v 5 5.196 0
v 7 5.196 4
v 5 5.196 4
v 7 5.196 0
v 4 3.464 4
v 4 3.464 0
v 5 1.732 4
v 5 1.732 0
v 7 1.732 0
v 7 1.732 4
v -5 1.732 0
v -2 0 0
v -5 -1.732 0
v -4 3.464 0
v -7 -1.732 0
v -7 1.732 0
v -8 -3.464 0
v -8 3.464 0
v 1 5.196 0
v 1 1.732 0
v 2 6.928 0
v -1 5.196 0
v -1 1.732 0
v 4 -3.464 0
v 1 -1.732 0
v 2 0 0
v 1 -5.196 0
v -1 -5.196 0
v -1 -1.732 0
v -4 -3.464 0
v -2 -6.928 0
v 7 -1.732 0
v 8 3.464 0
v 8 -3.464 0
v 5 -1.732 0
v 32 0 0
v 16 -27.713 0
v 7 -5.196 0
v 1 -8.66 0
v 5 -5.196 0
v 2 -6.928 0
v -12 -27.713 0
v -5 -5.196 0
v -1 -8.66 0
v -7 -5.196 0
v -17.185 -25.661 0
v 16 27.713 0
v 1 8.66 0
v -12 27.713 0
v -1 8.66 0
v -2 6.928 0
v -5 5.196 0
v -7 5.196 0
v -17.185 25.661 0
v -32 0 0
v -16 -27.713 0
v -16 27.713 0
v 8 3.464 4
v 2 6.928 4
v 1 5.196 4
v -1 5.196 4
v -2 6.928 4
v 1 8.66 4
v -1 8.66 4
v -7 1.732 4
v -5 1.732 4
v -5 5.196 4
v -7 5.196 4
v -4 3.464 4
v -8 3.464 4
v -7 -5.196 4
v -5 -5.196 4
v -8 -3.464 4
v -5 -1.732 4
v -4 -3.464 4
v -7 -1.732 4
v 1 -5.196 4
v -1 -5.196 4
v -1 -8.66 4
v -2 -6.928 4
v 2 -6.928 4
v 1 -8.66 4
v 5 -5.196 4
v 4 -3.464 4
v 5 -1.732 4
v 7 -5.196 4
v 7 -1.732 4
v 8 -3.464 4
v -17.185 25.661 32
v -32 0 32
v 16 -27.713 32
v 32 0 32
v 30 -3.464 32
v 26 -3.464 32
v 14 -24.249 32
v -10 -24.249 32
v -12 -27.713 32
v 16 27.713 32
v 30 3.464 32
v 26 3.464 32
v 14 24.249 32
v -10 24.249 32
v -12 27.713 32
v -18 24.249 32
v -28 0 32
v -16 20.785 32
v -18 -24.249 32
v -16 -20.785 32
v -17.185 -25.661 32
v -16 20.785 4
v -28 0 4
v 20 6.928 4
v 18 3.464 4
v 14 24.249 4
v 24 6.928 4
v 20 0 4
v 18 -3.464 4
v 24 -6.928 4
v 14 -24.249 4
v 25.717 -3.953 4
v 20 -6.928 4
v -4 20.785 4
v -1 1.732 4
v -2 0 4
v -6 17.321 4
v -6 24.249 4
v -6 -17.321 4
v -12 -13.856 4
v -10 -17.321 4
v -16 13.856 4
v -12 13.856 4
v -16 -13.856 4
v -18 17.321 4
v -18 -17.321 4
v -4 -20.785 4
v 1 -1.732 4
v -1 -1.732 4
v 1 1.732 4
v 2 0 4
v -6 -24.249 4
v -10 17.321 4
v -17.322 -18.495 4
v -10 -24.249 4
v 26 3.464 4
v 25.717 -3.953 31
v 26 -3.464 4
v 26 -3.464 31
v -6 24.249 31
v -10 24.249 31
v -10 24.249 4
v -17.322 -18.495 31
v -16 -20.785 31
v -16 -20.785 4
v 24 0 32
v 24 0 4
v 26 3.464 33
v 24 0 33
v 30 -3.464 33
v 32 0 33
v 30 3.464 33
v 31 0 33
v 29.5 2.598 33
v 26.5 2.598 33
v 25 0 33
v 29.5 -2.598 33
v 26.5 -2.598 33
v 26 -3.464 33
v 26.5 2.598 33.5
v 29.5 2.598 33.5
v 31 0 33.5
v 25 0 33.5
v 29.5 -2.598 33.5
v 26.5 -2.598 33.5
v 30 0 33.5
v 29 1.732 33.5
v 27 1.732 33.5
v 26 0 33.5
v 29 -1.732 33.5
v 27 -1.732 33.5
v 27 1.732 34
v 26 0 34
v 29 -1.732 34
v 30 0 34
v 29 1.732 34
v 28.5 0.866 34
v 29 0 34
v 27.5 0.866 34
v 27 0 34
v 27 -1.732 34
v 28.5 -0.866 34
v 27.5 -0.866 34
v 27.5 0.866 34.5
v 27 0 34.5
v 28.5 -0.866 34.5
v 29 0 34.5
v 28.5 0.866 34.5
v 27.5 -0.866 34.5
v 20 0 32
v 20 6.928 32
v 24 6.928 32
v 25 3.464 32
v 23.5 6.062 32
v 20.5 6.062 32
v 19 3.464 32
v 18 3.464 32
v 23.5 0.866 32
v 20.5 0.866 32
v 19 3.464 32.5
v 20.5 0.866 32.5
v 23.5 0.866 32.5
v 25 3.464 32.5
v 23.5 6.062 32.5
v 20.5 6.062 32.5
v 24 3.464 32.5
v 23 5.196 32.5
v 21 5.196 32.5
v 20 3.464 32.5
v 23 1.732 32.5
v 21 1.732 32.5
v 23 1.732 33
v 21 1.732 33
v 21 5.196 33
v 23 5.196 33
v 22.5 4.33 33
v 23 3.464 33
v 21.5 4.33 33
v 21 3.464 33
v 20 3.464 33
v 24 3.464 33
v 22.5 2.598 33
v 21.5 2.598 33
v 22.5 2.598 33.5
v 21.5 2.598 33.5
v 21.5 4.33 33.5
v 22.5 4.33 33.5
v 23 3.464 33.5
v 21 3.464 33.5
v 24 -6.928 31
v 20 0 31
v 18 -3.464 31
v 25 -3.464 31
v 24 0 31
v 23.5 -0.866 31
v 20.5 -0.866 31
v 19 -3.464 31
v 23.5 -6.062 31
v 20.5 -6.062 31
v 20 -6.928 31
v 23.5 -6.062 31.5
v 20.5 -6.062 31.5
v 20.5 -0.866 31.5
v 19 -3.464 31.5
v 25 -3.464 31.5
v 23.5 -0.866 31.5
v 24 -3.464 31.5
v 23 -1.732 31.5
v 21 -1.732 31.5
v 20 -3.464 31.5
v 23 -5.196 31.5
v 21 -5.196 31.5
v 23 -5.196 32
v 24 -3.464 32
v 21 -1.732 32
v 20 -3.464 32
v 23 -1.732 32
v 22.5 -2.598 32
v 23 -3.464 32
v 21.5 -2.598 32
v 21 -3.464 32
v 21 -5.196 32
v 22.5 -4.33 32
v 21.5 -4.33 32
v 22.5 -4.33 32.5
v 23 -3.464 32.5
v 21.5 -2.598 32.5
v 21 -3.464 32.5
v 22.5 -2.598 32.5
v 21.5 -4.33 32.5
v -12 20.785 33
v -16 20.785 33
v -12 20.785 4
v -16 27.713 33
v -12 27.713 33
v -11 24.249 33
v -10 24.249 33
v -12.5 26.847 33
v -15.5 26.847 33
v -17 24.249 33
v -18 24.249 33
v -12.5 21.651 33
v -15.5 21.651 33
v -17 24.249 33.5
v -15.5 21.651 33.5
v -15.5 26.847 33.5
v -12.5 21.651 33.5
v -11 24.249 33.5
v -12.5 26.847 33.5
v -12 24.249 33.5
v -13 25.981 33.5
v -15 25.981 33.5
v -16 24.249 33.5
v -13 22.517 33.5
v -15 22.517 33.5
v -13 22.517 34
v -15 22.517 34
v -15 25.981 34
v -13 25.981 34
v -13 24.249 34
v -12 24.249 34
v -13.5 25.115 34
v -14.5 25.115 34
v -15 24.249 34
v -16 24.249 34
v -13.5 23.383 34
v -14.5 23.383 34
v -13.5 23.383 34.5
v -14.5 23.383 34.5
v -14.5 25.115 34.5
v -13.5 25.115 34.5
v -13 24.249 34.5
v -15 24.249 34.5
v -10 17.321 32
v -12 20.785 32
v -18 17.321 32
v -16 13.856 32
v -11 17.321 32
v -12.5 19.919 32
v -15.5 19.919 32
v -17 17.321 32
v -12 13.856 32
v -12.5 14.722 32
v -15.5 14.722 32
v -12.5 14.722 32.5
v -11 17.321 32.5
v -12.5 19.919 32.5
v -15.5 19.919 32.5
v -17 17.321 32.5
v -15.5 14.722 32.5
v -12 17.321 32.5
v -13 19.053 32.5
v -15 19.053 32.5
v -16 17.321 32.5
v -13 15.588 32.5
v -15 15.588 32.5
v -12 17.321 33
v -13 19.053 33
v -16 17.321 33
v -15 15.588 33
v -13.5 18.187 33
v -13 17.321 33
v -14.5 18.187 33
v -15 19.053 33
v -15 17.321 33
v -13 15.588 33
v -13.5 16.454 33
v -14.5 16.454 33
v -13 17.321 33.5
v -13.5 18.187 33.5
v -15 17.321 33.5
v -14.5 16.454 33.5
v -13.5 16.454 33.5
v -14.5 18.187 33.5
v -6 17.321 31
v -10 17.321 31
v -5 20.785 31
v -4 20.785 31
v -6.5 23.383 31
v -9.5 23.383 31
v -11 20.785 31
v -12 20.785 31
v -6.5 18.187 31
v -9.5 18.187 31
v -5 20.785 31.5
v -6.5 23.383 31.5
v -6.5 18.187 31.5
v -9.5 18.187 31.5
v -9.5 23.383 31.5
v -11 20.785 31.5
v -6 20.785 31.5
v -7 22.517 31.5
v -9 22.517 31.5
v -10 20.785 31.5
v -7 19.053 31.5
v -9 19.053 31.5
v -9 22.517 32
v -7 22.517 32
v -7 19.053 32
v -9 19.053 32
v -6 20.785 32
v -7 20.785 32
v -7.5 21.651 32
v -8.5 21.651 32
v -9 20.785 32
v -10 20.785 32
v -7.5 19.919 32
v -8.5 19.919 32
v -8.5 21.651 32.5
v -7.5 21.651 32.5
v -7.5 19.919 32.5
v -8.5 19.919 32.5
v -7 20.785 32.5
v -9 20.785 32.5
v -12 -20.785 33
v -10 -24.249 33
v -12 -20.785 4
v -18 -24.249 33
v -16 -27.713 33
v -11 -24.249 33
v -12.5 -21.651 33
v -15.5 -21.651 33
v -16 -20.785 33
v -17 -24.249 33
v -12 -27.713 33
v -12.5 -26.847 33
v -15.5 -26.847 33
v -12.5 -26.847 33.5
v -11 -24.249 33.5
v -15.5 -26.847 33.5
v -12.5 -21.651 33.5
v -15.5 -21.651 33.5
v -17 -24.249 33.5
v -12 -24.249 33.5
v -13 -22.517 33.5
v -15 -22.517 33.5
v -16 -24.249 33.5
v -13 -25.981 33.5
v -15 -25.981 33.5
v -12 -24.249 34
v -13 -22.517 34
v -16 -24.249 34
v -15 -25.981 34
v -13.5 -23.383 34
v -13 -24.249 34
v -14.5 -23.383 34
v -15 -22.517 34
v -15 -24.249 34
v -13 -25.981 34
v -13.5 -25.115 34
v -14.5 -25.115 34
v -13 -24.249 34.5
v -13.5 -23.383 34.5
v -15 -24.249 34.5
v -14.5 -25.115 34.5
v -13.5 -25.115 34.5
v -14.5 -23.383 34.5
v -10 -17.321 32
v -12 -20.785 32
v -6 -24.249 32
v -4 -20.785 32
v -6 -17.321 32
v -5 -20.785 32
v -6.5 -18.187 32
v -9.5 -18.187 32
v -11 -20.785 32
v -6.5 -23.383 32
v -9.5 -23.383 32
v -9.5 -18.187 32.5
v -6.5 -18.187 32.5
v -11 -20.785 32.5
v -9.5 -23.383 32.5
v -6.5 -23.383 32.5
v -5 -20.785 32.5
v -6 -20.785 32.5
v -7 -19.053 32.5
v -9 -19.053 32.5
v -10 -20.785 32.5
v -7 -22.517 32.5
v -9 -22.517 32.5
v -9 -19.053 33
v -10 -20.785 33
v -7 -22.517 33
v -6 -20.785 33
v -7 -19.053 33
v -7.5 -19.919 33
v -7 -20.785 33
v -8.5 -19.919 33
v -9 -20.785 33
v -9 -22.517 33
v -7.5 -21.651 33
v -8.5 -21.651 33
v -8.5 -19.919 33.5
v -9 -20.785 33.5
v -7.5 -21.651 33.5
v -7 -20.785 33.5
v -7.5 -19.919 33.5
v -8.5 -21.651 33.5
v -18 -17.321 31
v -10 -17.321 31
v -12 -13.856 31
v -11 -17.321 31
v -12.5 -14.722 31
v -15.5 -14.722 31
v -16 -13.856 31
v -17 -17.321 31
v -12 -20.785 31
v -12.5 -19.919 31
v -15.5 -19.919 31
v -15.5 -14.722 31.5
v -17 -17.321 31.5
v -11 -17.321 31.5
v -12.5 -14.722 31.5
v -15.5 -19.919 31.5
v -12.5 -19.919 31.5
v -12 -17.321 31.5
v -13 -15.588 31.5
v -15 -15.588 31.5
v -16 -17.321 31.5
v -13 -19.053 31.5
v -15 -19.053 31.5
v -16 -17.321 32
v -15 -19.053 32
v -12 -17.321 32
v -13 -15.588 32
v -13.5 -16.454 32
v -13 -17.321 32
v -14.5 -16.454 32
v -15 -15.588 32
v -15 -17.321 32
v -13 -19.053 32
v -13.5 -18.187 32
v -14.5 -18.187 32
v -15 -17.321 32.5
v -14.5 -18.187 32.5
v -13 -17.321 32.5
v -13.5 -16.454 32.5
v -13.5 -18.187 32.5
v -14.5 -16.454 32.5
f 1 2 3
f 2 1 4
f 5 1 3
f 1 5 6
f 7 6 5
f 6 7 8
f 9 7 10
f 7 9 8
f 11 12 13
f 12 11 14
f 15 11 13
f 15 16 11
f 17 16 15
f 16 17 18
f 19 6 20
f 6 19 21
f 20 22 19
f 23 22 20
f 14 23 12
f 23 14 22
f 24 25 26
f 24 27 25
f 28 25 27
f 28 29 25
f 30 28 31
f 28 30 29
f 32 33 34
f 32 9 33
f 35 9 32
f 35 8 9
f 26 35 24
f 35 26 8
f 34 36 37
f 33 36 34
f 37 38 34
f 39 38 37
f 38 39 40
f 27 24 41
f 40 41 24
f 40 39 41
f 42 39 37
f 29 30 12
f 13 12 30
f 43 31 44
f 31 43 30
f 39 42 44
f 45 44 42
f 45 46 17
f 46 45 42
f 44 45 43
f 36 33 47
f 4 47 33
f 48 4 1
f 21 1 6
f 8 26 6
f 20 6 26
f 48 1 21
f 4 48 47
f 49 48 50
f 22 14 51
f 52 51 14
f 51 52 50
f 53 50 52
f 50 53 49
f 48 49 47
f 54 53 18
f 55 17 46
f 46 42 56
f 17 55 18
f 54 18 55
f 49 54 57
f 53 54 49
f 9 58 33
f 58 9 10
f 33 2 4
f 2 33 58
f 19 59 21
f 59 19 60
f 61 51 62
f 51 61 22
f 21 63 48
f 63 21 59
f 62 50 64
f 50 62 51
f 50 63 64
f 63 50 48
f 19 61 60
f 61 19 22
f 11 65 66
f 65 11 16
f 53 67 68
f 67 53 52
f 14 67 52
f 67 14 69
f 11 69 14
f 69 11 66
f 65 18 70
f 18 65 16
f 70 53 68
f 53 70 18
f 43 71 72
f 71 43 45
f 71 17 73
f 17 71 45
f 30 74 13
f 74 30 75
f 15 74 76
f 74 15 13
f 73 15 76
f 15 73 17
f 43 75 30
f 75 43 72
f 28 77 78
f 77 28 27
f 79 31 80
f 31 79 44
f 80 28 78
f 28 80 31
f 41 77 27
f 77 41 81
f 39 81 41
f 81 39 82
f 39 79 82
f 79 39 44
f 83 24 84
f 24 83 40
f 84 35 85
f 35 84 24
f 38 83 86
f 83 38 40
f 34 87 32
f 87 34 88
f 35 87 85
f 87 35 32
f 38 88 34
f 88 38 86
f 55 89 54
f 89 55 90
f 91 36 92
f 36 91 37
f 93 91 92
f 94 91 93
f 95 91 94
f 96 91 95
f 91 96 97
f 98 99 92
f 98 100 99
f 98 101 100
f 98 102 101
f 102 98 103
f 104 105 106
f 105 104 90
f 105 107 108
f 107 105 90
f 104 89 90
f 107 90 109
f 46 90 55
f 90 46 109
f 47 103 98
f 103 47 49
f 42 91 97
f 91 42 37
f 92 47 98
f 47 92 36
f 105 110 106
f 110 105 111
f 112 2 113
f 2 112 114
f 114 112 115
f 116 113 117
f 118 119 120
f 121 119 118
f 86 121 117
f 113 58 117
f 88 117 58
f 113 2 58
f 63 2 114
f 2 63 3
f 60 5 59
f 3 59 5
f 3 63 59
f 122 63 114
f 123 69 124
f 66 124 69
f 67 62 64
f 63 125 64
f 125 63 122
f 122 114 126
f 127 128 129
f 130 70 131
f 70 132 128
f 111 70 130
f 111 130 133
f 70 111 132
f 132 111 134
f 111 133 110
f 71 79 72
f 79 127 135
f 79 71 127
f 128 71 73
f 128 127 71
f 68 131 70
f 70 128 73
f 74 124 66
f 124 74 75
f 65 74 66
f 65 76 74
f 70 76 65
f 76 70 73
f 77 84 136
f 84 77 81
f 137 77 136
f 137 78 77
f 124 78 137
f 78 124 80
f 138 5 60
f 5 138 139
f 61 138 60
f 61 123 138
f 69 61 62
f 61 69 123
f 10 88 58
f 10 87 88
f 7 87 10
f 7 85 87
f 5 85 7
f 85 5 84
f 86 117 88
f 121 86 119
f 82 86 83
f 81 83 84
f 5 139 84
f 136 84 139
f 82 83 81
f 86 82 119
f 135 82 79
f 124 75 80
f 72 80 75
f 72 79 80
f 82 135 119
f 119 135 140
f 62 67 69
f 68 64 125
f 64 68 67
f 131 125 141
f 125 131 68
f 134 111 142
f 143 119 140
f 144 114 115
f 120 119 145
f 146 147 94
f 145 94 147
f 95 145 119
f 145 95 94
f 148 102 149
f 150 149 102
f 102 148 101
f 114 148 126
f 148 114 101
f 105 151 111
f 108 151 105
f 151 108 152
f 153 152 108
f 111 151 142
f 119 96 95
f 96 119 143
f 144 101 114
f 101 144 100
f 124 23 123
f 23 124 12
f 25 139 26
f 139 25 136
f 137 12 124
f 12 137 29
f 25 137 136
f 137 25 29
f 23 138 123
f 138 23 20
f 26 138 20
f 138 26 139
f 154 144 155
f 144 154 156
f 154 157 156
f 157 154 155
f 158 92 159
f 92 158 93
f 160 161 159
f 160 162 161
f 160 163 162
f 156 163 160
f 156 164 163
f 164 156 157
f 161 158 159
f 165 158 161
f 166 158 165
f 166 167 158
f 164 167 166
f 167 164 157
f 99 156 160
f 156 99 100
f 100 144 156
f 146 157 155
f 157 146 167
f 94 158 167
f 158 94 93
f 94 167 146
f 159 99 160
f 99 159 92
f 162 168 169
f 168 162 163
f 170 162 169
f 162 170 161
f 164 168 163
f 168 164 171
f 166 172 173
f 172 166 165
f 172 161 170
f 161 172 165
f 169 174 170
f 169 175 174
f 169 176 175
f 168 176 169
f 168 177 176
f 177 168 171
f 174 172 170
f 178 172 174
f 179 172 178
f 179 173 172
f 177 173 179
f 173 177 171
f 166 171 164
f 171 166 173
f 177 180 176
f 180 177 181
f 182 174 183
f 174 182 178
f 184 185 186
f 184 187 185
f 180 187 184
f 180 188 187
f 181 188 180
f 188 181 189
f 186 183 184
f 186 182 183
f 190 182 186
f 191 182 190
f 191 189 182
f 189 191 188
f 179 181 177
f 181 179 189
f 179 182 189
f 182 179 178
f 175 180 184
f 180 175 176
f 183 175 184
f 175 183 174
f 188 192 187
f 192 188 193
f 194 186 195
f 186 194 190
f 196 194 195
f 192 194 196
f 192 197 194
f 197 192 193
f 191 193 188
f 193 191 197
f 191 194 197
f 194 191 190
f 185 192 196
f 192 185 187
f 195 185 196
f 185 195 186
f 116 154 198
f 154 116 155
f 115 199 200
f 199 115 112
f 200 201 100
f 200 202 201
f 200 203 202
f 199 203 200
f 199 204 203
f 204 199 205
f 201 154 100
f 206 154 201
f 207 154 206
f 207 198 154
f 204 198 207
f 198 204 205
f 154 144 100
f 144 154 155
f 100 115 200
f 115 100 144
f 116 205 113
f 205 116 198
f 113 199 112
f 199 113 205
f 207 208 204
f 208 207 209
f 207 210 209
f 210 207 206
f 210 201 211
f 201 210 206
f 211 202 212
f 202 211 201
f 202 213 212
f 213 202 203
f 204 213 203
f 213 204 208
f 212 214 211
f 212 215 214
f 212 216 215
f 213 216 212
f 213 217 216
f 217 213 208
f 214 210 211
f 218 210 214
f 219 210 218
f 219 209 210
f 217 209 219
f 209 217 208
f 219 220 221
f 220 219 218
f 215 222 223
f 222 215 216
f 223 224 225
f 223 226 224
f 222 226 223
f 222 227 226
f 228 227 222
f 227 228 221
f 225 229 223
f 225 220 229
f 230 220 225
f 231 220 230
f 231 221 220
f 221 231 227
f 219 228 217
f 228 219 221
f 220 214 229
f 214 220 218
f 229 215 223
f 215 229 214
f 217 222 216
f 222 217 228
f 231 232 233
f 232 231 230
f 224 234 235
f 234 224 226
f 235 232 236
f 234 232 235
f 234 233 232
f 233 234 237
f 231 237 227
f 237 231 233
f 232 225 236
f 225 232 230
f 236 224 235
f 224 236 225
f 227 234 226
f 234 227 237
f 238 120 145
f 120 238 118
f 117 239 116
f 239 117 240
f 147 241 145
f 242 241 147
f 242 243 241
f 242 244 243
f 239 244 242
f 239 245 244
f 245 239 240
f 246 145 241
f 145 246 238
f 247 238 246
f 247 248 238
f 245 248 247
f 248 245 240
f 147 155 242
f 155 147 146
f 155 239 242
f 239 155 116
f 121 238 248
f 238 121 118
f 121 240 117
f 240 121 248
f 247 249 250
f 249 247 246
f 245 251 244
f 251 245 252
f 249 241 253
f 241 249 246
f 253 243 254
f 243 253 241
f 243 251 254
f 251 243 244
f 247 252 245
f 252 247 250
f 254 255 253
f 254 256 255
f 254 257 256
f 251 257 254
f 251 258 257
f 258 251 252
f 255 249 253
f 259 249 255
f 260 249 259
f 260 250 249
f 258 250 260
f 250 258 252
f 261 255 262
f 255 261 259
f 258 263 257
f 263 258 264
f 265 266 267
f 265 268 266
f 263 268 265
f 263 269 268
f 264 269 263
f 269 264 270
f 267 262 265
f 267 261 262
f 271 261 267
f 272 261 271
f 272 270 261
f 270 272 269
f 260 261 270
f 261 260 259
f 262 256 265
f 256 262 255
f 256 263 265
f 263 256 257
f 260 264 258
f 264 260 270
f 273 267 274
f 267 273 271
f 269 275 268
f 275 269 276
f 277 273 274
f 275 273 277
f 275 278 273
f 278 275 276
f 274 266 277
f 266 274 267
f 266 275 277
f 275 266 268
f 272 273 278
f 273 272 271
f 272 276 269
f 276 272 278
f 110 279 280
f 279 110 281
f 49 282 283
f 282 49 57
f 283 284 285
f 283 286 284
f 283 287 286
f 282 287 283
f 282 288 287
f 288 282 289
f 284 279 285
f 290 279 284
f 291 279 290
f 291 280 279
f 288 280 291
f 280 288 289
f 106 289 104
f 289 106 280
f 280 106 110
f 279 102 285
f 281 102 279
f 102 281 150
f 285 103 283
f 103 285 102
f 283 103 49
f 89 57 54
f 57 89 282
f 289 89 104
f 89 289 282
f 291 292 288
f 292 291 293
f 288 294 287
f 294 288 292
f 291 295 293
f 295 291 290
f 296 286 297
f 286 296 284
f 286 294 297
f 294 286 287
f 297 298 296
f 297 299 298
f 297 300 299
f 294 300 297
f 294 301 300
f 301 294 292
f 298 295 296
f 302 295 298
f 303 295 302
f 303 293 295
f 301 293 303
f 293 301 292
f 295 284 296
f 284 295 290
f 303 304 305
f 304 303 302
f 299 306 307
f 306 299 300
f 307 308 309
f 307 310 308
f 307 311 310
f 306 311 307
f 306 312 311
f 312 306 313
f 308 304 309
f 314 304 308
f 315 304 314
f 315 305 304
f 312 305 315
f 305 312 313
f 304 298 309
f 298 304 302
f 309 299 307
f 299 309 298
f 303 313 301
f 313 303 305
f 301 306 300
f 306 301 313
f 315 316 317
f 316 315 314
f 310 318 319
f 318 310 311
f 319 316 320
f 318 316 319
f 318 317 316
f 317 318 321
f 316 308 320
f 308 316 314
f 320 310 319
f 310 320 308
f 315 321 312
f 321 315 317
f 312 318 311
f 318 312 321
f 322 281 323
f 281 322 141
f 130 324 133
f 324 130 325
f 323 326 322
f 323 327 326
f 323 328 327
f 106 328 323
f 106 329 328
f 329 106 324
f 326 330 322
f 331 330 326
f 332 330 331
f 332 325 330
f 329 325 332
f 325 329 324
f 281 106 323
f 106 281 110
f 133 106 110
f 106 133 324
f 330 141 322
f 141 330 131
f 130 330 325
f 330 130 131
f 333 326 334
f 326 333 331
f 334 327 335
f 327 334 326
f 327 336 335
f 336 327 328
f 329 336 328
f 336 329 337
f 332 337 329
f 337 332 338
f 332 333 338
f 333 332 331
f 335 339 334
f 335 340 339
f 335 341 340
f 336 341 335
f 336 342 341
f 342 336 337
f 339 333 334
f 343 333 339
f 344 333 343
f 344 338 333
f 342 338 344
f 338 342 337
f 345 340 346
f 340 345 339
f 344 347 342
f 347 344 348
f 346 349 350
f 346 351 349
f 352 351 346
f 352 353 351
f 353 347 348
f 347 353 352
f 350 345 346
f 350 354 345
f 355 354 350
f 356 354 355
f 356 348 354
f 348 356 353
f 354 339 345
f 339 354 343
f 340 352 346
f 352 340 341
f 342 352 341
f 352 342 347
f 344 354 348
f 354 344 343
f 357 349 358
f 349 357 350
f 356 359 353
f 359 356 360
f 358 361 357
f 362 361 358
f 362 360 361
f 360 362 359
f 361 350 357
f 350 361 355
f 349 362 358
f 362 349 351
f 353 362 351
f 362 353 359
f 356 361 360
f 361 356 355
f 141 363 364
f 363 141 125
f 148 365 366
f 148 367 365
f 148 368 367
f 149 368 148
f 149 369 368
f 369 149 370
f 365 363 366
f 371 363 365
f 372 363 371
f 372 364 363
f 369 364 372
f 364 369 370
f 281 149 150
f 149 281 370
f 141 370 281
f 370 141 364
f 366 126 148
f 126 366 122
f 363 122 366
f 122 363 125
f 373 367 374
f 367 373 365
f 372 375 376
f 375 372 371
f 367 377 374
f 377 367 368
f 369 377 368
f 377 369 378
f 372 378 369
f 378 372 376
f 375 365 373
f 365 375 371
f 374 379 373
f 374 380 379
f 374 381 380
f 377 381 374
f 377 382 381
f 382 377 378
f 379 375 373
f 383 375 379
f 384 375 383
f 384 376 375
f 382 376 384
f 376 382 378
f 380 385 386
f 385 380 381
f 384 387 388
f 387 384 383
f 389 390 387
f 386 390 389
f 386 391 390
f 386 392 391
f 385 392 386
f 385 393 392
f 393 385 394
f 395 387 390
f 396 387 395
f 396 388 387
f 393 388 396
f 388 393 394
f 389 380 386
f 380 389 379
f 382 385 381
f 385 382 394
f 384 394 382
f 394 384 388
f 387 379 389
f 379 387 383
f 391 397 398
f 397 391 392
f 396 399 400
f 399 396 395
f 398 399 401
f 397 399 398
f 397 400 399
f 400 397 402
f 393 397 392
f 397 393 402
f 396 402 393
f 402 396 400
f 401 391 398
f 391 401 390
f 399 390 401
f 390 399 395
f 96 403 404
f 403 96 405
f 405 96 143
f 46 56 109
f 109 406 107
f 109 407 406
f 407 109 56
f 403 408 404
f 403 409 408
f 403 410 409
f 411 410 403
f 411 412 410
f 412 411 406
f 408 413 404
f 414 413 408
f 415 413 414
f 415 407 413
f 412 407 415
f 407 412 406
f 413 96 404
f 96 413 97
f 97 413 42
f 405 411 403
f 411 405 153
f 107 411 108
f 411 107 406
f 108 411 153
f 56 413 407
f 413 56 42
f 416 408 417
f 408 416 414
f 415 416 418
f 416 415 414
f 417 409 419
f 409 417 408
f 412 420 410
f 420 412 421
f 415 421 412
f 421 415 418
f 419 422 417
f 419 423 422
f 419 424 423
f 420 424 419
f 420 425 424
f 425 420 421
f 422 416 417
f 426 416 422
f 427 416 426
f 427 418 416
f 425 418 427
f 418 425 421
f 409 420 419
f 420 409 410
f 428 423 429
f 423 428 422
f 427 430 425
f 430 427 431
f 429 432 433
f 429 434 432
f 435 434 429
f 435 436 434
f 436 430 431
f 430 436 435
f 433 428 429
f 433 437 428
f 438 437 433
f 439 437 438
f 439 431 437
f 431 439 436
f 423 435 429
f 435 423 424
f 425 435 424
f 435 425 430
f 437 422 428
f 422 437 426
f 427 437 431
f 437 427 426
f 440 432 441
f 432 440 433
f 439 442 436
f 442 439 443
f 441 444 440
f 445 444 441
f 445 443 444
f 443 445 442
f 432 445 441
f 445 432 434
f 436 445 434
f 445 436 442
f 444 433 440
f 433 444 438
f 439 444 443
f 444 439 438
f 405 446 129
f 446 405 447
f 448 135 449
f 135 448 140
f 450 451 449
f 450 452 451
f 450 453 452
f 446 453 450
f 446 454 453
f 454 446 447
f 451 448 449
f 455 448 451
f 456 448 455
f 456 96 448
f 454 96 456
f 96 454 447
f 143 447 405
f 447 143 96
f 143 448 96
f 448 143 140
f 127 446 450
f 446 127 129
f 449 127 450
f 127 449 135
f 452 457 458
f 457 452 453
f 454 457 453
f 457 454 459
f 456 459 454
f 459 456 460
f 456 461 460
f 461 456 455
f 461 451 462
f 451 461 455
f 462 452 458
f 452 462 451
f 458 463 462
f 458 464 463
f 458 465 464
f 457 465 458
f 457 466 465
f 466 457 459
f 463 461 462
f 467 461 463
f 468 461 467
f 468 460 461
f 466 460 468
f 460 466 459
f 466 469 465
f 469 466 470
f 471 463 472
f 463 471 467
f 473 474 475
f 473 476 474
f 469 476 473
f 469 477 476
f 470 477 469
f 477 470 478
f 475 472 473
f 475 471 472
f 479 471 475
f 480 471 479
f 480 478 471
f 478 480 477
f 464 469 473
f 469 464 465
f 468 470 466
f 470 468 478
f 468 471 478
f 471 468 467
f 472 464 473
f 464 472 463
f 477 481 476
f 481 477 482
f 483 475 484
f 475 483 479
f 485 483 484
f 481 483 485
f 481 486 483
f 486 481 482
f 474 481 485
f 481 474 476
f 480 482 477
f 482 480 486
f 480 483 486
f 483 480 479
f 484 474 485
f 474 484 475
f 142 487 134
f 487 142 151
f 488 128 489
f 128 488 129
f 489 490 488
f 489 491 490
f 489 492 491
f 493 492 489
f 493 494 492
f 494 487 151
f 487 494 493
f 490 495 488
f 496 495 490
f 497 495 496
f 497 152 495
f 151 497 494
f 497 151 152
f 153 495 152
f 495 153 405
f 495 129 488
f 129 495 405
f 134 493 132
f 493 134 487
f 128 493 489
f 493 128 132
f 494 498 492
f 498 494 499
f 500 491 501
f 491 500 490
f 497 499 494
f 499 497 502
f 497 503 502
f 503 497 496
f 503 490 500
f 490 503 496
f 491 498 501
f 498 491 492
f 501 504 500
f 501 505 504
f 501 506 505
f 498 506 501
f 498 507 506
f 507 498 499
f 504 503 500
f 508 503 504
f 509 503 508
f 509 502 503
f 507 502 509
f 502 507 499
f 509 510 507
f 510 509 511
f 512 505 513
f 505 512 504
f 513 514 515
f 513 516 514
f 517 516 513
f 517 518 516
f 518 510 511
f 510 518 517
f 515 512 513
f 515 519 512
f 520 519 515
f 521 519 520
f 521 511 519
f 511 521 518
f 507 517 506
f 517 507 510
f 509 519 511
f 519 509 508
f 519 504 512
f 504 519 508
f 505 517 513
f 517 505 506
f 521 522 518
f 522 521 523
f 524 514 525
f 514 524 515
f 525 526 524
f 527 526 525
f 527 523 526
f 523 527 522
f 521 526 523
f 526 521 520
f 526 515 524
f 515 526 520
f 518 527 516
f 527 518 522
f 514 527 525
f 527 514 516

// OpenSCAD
// file: planter_base.scad
module planter_base() {
    difference() {
        linear_extrude(32) circle(32, $fn=6);
        translate([0, 0, 4]) linear_extrude(32) circle(28, $fn = 6);
        linear_extrude(8) circle(2, $fn = 6);
        for (i = [0:60:300]) {
            linear_extrude(8) rotate(i) translate([6, cos(30)*4]) circle(2, $fn = 6);
        }
    }
}
// main file
include <planter_base.scad>;

module planter_00() {
    module pillar(height) {
        linear_extrude(height) circle(4, $fn = 6);
        linear_extrude(height + 0.5) circle(3, $fn = 6);
        linear_extrude(height + 1) circle(2, $fn = 6);
        linear_extrude(height + 1.5) circle(1, $fn = 6);
    }
    union() {
        planter_base();
        for (i = [0:120:240]) {
            rotate(i) translate([28, 0]) {
                pillar(33);
                rotate(120) translate([6, cos(30)*4]) pillar(32);
                rotate(180) translate([6, cos(30)*4]) pillar(31);
            }
        }
    }
}

if (is_undef($demo)) {
    planter_00();
}
